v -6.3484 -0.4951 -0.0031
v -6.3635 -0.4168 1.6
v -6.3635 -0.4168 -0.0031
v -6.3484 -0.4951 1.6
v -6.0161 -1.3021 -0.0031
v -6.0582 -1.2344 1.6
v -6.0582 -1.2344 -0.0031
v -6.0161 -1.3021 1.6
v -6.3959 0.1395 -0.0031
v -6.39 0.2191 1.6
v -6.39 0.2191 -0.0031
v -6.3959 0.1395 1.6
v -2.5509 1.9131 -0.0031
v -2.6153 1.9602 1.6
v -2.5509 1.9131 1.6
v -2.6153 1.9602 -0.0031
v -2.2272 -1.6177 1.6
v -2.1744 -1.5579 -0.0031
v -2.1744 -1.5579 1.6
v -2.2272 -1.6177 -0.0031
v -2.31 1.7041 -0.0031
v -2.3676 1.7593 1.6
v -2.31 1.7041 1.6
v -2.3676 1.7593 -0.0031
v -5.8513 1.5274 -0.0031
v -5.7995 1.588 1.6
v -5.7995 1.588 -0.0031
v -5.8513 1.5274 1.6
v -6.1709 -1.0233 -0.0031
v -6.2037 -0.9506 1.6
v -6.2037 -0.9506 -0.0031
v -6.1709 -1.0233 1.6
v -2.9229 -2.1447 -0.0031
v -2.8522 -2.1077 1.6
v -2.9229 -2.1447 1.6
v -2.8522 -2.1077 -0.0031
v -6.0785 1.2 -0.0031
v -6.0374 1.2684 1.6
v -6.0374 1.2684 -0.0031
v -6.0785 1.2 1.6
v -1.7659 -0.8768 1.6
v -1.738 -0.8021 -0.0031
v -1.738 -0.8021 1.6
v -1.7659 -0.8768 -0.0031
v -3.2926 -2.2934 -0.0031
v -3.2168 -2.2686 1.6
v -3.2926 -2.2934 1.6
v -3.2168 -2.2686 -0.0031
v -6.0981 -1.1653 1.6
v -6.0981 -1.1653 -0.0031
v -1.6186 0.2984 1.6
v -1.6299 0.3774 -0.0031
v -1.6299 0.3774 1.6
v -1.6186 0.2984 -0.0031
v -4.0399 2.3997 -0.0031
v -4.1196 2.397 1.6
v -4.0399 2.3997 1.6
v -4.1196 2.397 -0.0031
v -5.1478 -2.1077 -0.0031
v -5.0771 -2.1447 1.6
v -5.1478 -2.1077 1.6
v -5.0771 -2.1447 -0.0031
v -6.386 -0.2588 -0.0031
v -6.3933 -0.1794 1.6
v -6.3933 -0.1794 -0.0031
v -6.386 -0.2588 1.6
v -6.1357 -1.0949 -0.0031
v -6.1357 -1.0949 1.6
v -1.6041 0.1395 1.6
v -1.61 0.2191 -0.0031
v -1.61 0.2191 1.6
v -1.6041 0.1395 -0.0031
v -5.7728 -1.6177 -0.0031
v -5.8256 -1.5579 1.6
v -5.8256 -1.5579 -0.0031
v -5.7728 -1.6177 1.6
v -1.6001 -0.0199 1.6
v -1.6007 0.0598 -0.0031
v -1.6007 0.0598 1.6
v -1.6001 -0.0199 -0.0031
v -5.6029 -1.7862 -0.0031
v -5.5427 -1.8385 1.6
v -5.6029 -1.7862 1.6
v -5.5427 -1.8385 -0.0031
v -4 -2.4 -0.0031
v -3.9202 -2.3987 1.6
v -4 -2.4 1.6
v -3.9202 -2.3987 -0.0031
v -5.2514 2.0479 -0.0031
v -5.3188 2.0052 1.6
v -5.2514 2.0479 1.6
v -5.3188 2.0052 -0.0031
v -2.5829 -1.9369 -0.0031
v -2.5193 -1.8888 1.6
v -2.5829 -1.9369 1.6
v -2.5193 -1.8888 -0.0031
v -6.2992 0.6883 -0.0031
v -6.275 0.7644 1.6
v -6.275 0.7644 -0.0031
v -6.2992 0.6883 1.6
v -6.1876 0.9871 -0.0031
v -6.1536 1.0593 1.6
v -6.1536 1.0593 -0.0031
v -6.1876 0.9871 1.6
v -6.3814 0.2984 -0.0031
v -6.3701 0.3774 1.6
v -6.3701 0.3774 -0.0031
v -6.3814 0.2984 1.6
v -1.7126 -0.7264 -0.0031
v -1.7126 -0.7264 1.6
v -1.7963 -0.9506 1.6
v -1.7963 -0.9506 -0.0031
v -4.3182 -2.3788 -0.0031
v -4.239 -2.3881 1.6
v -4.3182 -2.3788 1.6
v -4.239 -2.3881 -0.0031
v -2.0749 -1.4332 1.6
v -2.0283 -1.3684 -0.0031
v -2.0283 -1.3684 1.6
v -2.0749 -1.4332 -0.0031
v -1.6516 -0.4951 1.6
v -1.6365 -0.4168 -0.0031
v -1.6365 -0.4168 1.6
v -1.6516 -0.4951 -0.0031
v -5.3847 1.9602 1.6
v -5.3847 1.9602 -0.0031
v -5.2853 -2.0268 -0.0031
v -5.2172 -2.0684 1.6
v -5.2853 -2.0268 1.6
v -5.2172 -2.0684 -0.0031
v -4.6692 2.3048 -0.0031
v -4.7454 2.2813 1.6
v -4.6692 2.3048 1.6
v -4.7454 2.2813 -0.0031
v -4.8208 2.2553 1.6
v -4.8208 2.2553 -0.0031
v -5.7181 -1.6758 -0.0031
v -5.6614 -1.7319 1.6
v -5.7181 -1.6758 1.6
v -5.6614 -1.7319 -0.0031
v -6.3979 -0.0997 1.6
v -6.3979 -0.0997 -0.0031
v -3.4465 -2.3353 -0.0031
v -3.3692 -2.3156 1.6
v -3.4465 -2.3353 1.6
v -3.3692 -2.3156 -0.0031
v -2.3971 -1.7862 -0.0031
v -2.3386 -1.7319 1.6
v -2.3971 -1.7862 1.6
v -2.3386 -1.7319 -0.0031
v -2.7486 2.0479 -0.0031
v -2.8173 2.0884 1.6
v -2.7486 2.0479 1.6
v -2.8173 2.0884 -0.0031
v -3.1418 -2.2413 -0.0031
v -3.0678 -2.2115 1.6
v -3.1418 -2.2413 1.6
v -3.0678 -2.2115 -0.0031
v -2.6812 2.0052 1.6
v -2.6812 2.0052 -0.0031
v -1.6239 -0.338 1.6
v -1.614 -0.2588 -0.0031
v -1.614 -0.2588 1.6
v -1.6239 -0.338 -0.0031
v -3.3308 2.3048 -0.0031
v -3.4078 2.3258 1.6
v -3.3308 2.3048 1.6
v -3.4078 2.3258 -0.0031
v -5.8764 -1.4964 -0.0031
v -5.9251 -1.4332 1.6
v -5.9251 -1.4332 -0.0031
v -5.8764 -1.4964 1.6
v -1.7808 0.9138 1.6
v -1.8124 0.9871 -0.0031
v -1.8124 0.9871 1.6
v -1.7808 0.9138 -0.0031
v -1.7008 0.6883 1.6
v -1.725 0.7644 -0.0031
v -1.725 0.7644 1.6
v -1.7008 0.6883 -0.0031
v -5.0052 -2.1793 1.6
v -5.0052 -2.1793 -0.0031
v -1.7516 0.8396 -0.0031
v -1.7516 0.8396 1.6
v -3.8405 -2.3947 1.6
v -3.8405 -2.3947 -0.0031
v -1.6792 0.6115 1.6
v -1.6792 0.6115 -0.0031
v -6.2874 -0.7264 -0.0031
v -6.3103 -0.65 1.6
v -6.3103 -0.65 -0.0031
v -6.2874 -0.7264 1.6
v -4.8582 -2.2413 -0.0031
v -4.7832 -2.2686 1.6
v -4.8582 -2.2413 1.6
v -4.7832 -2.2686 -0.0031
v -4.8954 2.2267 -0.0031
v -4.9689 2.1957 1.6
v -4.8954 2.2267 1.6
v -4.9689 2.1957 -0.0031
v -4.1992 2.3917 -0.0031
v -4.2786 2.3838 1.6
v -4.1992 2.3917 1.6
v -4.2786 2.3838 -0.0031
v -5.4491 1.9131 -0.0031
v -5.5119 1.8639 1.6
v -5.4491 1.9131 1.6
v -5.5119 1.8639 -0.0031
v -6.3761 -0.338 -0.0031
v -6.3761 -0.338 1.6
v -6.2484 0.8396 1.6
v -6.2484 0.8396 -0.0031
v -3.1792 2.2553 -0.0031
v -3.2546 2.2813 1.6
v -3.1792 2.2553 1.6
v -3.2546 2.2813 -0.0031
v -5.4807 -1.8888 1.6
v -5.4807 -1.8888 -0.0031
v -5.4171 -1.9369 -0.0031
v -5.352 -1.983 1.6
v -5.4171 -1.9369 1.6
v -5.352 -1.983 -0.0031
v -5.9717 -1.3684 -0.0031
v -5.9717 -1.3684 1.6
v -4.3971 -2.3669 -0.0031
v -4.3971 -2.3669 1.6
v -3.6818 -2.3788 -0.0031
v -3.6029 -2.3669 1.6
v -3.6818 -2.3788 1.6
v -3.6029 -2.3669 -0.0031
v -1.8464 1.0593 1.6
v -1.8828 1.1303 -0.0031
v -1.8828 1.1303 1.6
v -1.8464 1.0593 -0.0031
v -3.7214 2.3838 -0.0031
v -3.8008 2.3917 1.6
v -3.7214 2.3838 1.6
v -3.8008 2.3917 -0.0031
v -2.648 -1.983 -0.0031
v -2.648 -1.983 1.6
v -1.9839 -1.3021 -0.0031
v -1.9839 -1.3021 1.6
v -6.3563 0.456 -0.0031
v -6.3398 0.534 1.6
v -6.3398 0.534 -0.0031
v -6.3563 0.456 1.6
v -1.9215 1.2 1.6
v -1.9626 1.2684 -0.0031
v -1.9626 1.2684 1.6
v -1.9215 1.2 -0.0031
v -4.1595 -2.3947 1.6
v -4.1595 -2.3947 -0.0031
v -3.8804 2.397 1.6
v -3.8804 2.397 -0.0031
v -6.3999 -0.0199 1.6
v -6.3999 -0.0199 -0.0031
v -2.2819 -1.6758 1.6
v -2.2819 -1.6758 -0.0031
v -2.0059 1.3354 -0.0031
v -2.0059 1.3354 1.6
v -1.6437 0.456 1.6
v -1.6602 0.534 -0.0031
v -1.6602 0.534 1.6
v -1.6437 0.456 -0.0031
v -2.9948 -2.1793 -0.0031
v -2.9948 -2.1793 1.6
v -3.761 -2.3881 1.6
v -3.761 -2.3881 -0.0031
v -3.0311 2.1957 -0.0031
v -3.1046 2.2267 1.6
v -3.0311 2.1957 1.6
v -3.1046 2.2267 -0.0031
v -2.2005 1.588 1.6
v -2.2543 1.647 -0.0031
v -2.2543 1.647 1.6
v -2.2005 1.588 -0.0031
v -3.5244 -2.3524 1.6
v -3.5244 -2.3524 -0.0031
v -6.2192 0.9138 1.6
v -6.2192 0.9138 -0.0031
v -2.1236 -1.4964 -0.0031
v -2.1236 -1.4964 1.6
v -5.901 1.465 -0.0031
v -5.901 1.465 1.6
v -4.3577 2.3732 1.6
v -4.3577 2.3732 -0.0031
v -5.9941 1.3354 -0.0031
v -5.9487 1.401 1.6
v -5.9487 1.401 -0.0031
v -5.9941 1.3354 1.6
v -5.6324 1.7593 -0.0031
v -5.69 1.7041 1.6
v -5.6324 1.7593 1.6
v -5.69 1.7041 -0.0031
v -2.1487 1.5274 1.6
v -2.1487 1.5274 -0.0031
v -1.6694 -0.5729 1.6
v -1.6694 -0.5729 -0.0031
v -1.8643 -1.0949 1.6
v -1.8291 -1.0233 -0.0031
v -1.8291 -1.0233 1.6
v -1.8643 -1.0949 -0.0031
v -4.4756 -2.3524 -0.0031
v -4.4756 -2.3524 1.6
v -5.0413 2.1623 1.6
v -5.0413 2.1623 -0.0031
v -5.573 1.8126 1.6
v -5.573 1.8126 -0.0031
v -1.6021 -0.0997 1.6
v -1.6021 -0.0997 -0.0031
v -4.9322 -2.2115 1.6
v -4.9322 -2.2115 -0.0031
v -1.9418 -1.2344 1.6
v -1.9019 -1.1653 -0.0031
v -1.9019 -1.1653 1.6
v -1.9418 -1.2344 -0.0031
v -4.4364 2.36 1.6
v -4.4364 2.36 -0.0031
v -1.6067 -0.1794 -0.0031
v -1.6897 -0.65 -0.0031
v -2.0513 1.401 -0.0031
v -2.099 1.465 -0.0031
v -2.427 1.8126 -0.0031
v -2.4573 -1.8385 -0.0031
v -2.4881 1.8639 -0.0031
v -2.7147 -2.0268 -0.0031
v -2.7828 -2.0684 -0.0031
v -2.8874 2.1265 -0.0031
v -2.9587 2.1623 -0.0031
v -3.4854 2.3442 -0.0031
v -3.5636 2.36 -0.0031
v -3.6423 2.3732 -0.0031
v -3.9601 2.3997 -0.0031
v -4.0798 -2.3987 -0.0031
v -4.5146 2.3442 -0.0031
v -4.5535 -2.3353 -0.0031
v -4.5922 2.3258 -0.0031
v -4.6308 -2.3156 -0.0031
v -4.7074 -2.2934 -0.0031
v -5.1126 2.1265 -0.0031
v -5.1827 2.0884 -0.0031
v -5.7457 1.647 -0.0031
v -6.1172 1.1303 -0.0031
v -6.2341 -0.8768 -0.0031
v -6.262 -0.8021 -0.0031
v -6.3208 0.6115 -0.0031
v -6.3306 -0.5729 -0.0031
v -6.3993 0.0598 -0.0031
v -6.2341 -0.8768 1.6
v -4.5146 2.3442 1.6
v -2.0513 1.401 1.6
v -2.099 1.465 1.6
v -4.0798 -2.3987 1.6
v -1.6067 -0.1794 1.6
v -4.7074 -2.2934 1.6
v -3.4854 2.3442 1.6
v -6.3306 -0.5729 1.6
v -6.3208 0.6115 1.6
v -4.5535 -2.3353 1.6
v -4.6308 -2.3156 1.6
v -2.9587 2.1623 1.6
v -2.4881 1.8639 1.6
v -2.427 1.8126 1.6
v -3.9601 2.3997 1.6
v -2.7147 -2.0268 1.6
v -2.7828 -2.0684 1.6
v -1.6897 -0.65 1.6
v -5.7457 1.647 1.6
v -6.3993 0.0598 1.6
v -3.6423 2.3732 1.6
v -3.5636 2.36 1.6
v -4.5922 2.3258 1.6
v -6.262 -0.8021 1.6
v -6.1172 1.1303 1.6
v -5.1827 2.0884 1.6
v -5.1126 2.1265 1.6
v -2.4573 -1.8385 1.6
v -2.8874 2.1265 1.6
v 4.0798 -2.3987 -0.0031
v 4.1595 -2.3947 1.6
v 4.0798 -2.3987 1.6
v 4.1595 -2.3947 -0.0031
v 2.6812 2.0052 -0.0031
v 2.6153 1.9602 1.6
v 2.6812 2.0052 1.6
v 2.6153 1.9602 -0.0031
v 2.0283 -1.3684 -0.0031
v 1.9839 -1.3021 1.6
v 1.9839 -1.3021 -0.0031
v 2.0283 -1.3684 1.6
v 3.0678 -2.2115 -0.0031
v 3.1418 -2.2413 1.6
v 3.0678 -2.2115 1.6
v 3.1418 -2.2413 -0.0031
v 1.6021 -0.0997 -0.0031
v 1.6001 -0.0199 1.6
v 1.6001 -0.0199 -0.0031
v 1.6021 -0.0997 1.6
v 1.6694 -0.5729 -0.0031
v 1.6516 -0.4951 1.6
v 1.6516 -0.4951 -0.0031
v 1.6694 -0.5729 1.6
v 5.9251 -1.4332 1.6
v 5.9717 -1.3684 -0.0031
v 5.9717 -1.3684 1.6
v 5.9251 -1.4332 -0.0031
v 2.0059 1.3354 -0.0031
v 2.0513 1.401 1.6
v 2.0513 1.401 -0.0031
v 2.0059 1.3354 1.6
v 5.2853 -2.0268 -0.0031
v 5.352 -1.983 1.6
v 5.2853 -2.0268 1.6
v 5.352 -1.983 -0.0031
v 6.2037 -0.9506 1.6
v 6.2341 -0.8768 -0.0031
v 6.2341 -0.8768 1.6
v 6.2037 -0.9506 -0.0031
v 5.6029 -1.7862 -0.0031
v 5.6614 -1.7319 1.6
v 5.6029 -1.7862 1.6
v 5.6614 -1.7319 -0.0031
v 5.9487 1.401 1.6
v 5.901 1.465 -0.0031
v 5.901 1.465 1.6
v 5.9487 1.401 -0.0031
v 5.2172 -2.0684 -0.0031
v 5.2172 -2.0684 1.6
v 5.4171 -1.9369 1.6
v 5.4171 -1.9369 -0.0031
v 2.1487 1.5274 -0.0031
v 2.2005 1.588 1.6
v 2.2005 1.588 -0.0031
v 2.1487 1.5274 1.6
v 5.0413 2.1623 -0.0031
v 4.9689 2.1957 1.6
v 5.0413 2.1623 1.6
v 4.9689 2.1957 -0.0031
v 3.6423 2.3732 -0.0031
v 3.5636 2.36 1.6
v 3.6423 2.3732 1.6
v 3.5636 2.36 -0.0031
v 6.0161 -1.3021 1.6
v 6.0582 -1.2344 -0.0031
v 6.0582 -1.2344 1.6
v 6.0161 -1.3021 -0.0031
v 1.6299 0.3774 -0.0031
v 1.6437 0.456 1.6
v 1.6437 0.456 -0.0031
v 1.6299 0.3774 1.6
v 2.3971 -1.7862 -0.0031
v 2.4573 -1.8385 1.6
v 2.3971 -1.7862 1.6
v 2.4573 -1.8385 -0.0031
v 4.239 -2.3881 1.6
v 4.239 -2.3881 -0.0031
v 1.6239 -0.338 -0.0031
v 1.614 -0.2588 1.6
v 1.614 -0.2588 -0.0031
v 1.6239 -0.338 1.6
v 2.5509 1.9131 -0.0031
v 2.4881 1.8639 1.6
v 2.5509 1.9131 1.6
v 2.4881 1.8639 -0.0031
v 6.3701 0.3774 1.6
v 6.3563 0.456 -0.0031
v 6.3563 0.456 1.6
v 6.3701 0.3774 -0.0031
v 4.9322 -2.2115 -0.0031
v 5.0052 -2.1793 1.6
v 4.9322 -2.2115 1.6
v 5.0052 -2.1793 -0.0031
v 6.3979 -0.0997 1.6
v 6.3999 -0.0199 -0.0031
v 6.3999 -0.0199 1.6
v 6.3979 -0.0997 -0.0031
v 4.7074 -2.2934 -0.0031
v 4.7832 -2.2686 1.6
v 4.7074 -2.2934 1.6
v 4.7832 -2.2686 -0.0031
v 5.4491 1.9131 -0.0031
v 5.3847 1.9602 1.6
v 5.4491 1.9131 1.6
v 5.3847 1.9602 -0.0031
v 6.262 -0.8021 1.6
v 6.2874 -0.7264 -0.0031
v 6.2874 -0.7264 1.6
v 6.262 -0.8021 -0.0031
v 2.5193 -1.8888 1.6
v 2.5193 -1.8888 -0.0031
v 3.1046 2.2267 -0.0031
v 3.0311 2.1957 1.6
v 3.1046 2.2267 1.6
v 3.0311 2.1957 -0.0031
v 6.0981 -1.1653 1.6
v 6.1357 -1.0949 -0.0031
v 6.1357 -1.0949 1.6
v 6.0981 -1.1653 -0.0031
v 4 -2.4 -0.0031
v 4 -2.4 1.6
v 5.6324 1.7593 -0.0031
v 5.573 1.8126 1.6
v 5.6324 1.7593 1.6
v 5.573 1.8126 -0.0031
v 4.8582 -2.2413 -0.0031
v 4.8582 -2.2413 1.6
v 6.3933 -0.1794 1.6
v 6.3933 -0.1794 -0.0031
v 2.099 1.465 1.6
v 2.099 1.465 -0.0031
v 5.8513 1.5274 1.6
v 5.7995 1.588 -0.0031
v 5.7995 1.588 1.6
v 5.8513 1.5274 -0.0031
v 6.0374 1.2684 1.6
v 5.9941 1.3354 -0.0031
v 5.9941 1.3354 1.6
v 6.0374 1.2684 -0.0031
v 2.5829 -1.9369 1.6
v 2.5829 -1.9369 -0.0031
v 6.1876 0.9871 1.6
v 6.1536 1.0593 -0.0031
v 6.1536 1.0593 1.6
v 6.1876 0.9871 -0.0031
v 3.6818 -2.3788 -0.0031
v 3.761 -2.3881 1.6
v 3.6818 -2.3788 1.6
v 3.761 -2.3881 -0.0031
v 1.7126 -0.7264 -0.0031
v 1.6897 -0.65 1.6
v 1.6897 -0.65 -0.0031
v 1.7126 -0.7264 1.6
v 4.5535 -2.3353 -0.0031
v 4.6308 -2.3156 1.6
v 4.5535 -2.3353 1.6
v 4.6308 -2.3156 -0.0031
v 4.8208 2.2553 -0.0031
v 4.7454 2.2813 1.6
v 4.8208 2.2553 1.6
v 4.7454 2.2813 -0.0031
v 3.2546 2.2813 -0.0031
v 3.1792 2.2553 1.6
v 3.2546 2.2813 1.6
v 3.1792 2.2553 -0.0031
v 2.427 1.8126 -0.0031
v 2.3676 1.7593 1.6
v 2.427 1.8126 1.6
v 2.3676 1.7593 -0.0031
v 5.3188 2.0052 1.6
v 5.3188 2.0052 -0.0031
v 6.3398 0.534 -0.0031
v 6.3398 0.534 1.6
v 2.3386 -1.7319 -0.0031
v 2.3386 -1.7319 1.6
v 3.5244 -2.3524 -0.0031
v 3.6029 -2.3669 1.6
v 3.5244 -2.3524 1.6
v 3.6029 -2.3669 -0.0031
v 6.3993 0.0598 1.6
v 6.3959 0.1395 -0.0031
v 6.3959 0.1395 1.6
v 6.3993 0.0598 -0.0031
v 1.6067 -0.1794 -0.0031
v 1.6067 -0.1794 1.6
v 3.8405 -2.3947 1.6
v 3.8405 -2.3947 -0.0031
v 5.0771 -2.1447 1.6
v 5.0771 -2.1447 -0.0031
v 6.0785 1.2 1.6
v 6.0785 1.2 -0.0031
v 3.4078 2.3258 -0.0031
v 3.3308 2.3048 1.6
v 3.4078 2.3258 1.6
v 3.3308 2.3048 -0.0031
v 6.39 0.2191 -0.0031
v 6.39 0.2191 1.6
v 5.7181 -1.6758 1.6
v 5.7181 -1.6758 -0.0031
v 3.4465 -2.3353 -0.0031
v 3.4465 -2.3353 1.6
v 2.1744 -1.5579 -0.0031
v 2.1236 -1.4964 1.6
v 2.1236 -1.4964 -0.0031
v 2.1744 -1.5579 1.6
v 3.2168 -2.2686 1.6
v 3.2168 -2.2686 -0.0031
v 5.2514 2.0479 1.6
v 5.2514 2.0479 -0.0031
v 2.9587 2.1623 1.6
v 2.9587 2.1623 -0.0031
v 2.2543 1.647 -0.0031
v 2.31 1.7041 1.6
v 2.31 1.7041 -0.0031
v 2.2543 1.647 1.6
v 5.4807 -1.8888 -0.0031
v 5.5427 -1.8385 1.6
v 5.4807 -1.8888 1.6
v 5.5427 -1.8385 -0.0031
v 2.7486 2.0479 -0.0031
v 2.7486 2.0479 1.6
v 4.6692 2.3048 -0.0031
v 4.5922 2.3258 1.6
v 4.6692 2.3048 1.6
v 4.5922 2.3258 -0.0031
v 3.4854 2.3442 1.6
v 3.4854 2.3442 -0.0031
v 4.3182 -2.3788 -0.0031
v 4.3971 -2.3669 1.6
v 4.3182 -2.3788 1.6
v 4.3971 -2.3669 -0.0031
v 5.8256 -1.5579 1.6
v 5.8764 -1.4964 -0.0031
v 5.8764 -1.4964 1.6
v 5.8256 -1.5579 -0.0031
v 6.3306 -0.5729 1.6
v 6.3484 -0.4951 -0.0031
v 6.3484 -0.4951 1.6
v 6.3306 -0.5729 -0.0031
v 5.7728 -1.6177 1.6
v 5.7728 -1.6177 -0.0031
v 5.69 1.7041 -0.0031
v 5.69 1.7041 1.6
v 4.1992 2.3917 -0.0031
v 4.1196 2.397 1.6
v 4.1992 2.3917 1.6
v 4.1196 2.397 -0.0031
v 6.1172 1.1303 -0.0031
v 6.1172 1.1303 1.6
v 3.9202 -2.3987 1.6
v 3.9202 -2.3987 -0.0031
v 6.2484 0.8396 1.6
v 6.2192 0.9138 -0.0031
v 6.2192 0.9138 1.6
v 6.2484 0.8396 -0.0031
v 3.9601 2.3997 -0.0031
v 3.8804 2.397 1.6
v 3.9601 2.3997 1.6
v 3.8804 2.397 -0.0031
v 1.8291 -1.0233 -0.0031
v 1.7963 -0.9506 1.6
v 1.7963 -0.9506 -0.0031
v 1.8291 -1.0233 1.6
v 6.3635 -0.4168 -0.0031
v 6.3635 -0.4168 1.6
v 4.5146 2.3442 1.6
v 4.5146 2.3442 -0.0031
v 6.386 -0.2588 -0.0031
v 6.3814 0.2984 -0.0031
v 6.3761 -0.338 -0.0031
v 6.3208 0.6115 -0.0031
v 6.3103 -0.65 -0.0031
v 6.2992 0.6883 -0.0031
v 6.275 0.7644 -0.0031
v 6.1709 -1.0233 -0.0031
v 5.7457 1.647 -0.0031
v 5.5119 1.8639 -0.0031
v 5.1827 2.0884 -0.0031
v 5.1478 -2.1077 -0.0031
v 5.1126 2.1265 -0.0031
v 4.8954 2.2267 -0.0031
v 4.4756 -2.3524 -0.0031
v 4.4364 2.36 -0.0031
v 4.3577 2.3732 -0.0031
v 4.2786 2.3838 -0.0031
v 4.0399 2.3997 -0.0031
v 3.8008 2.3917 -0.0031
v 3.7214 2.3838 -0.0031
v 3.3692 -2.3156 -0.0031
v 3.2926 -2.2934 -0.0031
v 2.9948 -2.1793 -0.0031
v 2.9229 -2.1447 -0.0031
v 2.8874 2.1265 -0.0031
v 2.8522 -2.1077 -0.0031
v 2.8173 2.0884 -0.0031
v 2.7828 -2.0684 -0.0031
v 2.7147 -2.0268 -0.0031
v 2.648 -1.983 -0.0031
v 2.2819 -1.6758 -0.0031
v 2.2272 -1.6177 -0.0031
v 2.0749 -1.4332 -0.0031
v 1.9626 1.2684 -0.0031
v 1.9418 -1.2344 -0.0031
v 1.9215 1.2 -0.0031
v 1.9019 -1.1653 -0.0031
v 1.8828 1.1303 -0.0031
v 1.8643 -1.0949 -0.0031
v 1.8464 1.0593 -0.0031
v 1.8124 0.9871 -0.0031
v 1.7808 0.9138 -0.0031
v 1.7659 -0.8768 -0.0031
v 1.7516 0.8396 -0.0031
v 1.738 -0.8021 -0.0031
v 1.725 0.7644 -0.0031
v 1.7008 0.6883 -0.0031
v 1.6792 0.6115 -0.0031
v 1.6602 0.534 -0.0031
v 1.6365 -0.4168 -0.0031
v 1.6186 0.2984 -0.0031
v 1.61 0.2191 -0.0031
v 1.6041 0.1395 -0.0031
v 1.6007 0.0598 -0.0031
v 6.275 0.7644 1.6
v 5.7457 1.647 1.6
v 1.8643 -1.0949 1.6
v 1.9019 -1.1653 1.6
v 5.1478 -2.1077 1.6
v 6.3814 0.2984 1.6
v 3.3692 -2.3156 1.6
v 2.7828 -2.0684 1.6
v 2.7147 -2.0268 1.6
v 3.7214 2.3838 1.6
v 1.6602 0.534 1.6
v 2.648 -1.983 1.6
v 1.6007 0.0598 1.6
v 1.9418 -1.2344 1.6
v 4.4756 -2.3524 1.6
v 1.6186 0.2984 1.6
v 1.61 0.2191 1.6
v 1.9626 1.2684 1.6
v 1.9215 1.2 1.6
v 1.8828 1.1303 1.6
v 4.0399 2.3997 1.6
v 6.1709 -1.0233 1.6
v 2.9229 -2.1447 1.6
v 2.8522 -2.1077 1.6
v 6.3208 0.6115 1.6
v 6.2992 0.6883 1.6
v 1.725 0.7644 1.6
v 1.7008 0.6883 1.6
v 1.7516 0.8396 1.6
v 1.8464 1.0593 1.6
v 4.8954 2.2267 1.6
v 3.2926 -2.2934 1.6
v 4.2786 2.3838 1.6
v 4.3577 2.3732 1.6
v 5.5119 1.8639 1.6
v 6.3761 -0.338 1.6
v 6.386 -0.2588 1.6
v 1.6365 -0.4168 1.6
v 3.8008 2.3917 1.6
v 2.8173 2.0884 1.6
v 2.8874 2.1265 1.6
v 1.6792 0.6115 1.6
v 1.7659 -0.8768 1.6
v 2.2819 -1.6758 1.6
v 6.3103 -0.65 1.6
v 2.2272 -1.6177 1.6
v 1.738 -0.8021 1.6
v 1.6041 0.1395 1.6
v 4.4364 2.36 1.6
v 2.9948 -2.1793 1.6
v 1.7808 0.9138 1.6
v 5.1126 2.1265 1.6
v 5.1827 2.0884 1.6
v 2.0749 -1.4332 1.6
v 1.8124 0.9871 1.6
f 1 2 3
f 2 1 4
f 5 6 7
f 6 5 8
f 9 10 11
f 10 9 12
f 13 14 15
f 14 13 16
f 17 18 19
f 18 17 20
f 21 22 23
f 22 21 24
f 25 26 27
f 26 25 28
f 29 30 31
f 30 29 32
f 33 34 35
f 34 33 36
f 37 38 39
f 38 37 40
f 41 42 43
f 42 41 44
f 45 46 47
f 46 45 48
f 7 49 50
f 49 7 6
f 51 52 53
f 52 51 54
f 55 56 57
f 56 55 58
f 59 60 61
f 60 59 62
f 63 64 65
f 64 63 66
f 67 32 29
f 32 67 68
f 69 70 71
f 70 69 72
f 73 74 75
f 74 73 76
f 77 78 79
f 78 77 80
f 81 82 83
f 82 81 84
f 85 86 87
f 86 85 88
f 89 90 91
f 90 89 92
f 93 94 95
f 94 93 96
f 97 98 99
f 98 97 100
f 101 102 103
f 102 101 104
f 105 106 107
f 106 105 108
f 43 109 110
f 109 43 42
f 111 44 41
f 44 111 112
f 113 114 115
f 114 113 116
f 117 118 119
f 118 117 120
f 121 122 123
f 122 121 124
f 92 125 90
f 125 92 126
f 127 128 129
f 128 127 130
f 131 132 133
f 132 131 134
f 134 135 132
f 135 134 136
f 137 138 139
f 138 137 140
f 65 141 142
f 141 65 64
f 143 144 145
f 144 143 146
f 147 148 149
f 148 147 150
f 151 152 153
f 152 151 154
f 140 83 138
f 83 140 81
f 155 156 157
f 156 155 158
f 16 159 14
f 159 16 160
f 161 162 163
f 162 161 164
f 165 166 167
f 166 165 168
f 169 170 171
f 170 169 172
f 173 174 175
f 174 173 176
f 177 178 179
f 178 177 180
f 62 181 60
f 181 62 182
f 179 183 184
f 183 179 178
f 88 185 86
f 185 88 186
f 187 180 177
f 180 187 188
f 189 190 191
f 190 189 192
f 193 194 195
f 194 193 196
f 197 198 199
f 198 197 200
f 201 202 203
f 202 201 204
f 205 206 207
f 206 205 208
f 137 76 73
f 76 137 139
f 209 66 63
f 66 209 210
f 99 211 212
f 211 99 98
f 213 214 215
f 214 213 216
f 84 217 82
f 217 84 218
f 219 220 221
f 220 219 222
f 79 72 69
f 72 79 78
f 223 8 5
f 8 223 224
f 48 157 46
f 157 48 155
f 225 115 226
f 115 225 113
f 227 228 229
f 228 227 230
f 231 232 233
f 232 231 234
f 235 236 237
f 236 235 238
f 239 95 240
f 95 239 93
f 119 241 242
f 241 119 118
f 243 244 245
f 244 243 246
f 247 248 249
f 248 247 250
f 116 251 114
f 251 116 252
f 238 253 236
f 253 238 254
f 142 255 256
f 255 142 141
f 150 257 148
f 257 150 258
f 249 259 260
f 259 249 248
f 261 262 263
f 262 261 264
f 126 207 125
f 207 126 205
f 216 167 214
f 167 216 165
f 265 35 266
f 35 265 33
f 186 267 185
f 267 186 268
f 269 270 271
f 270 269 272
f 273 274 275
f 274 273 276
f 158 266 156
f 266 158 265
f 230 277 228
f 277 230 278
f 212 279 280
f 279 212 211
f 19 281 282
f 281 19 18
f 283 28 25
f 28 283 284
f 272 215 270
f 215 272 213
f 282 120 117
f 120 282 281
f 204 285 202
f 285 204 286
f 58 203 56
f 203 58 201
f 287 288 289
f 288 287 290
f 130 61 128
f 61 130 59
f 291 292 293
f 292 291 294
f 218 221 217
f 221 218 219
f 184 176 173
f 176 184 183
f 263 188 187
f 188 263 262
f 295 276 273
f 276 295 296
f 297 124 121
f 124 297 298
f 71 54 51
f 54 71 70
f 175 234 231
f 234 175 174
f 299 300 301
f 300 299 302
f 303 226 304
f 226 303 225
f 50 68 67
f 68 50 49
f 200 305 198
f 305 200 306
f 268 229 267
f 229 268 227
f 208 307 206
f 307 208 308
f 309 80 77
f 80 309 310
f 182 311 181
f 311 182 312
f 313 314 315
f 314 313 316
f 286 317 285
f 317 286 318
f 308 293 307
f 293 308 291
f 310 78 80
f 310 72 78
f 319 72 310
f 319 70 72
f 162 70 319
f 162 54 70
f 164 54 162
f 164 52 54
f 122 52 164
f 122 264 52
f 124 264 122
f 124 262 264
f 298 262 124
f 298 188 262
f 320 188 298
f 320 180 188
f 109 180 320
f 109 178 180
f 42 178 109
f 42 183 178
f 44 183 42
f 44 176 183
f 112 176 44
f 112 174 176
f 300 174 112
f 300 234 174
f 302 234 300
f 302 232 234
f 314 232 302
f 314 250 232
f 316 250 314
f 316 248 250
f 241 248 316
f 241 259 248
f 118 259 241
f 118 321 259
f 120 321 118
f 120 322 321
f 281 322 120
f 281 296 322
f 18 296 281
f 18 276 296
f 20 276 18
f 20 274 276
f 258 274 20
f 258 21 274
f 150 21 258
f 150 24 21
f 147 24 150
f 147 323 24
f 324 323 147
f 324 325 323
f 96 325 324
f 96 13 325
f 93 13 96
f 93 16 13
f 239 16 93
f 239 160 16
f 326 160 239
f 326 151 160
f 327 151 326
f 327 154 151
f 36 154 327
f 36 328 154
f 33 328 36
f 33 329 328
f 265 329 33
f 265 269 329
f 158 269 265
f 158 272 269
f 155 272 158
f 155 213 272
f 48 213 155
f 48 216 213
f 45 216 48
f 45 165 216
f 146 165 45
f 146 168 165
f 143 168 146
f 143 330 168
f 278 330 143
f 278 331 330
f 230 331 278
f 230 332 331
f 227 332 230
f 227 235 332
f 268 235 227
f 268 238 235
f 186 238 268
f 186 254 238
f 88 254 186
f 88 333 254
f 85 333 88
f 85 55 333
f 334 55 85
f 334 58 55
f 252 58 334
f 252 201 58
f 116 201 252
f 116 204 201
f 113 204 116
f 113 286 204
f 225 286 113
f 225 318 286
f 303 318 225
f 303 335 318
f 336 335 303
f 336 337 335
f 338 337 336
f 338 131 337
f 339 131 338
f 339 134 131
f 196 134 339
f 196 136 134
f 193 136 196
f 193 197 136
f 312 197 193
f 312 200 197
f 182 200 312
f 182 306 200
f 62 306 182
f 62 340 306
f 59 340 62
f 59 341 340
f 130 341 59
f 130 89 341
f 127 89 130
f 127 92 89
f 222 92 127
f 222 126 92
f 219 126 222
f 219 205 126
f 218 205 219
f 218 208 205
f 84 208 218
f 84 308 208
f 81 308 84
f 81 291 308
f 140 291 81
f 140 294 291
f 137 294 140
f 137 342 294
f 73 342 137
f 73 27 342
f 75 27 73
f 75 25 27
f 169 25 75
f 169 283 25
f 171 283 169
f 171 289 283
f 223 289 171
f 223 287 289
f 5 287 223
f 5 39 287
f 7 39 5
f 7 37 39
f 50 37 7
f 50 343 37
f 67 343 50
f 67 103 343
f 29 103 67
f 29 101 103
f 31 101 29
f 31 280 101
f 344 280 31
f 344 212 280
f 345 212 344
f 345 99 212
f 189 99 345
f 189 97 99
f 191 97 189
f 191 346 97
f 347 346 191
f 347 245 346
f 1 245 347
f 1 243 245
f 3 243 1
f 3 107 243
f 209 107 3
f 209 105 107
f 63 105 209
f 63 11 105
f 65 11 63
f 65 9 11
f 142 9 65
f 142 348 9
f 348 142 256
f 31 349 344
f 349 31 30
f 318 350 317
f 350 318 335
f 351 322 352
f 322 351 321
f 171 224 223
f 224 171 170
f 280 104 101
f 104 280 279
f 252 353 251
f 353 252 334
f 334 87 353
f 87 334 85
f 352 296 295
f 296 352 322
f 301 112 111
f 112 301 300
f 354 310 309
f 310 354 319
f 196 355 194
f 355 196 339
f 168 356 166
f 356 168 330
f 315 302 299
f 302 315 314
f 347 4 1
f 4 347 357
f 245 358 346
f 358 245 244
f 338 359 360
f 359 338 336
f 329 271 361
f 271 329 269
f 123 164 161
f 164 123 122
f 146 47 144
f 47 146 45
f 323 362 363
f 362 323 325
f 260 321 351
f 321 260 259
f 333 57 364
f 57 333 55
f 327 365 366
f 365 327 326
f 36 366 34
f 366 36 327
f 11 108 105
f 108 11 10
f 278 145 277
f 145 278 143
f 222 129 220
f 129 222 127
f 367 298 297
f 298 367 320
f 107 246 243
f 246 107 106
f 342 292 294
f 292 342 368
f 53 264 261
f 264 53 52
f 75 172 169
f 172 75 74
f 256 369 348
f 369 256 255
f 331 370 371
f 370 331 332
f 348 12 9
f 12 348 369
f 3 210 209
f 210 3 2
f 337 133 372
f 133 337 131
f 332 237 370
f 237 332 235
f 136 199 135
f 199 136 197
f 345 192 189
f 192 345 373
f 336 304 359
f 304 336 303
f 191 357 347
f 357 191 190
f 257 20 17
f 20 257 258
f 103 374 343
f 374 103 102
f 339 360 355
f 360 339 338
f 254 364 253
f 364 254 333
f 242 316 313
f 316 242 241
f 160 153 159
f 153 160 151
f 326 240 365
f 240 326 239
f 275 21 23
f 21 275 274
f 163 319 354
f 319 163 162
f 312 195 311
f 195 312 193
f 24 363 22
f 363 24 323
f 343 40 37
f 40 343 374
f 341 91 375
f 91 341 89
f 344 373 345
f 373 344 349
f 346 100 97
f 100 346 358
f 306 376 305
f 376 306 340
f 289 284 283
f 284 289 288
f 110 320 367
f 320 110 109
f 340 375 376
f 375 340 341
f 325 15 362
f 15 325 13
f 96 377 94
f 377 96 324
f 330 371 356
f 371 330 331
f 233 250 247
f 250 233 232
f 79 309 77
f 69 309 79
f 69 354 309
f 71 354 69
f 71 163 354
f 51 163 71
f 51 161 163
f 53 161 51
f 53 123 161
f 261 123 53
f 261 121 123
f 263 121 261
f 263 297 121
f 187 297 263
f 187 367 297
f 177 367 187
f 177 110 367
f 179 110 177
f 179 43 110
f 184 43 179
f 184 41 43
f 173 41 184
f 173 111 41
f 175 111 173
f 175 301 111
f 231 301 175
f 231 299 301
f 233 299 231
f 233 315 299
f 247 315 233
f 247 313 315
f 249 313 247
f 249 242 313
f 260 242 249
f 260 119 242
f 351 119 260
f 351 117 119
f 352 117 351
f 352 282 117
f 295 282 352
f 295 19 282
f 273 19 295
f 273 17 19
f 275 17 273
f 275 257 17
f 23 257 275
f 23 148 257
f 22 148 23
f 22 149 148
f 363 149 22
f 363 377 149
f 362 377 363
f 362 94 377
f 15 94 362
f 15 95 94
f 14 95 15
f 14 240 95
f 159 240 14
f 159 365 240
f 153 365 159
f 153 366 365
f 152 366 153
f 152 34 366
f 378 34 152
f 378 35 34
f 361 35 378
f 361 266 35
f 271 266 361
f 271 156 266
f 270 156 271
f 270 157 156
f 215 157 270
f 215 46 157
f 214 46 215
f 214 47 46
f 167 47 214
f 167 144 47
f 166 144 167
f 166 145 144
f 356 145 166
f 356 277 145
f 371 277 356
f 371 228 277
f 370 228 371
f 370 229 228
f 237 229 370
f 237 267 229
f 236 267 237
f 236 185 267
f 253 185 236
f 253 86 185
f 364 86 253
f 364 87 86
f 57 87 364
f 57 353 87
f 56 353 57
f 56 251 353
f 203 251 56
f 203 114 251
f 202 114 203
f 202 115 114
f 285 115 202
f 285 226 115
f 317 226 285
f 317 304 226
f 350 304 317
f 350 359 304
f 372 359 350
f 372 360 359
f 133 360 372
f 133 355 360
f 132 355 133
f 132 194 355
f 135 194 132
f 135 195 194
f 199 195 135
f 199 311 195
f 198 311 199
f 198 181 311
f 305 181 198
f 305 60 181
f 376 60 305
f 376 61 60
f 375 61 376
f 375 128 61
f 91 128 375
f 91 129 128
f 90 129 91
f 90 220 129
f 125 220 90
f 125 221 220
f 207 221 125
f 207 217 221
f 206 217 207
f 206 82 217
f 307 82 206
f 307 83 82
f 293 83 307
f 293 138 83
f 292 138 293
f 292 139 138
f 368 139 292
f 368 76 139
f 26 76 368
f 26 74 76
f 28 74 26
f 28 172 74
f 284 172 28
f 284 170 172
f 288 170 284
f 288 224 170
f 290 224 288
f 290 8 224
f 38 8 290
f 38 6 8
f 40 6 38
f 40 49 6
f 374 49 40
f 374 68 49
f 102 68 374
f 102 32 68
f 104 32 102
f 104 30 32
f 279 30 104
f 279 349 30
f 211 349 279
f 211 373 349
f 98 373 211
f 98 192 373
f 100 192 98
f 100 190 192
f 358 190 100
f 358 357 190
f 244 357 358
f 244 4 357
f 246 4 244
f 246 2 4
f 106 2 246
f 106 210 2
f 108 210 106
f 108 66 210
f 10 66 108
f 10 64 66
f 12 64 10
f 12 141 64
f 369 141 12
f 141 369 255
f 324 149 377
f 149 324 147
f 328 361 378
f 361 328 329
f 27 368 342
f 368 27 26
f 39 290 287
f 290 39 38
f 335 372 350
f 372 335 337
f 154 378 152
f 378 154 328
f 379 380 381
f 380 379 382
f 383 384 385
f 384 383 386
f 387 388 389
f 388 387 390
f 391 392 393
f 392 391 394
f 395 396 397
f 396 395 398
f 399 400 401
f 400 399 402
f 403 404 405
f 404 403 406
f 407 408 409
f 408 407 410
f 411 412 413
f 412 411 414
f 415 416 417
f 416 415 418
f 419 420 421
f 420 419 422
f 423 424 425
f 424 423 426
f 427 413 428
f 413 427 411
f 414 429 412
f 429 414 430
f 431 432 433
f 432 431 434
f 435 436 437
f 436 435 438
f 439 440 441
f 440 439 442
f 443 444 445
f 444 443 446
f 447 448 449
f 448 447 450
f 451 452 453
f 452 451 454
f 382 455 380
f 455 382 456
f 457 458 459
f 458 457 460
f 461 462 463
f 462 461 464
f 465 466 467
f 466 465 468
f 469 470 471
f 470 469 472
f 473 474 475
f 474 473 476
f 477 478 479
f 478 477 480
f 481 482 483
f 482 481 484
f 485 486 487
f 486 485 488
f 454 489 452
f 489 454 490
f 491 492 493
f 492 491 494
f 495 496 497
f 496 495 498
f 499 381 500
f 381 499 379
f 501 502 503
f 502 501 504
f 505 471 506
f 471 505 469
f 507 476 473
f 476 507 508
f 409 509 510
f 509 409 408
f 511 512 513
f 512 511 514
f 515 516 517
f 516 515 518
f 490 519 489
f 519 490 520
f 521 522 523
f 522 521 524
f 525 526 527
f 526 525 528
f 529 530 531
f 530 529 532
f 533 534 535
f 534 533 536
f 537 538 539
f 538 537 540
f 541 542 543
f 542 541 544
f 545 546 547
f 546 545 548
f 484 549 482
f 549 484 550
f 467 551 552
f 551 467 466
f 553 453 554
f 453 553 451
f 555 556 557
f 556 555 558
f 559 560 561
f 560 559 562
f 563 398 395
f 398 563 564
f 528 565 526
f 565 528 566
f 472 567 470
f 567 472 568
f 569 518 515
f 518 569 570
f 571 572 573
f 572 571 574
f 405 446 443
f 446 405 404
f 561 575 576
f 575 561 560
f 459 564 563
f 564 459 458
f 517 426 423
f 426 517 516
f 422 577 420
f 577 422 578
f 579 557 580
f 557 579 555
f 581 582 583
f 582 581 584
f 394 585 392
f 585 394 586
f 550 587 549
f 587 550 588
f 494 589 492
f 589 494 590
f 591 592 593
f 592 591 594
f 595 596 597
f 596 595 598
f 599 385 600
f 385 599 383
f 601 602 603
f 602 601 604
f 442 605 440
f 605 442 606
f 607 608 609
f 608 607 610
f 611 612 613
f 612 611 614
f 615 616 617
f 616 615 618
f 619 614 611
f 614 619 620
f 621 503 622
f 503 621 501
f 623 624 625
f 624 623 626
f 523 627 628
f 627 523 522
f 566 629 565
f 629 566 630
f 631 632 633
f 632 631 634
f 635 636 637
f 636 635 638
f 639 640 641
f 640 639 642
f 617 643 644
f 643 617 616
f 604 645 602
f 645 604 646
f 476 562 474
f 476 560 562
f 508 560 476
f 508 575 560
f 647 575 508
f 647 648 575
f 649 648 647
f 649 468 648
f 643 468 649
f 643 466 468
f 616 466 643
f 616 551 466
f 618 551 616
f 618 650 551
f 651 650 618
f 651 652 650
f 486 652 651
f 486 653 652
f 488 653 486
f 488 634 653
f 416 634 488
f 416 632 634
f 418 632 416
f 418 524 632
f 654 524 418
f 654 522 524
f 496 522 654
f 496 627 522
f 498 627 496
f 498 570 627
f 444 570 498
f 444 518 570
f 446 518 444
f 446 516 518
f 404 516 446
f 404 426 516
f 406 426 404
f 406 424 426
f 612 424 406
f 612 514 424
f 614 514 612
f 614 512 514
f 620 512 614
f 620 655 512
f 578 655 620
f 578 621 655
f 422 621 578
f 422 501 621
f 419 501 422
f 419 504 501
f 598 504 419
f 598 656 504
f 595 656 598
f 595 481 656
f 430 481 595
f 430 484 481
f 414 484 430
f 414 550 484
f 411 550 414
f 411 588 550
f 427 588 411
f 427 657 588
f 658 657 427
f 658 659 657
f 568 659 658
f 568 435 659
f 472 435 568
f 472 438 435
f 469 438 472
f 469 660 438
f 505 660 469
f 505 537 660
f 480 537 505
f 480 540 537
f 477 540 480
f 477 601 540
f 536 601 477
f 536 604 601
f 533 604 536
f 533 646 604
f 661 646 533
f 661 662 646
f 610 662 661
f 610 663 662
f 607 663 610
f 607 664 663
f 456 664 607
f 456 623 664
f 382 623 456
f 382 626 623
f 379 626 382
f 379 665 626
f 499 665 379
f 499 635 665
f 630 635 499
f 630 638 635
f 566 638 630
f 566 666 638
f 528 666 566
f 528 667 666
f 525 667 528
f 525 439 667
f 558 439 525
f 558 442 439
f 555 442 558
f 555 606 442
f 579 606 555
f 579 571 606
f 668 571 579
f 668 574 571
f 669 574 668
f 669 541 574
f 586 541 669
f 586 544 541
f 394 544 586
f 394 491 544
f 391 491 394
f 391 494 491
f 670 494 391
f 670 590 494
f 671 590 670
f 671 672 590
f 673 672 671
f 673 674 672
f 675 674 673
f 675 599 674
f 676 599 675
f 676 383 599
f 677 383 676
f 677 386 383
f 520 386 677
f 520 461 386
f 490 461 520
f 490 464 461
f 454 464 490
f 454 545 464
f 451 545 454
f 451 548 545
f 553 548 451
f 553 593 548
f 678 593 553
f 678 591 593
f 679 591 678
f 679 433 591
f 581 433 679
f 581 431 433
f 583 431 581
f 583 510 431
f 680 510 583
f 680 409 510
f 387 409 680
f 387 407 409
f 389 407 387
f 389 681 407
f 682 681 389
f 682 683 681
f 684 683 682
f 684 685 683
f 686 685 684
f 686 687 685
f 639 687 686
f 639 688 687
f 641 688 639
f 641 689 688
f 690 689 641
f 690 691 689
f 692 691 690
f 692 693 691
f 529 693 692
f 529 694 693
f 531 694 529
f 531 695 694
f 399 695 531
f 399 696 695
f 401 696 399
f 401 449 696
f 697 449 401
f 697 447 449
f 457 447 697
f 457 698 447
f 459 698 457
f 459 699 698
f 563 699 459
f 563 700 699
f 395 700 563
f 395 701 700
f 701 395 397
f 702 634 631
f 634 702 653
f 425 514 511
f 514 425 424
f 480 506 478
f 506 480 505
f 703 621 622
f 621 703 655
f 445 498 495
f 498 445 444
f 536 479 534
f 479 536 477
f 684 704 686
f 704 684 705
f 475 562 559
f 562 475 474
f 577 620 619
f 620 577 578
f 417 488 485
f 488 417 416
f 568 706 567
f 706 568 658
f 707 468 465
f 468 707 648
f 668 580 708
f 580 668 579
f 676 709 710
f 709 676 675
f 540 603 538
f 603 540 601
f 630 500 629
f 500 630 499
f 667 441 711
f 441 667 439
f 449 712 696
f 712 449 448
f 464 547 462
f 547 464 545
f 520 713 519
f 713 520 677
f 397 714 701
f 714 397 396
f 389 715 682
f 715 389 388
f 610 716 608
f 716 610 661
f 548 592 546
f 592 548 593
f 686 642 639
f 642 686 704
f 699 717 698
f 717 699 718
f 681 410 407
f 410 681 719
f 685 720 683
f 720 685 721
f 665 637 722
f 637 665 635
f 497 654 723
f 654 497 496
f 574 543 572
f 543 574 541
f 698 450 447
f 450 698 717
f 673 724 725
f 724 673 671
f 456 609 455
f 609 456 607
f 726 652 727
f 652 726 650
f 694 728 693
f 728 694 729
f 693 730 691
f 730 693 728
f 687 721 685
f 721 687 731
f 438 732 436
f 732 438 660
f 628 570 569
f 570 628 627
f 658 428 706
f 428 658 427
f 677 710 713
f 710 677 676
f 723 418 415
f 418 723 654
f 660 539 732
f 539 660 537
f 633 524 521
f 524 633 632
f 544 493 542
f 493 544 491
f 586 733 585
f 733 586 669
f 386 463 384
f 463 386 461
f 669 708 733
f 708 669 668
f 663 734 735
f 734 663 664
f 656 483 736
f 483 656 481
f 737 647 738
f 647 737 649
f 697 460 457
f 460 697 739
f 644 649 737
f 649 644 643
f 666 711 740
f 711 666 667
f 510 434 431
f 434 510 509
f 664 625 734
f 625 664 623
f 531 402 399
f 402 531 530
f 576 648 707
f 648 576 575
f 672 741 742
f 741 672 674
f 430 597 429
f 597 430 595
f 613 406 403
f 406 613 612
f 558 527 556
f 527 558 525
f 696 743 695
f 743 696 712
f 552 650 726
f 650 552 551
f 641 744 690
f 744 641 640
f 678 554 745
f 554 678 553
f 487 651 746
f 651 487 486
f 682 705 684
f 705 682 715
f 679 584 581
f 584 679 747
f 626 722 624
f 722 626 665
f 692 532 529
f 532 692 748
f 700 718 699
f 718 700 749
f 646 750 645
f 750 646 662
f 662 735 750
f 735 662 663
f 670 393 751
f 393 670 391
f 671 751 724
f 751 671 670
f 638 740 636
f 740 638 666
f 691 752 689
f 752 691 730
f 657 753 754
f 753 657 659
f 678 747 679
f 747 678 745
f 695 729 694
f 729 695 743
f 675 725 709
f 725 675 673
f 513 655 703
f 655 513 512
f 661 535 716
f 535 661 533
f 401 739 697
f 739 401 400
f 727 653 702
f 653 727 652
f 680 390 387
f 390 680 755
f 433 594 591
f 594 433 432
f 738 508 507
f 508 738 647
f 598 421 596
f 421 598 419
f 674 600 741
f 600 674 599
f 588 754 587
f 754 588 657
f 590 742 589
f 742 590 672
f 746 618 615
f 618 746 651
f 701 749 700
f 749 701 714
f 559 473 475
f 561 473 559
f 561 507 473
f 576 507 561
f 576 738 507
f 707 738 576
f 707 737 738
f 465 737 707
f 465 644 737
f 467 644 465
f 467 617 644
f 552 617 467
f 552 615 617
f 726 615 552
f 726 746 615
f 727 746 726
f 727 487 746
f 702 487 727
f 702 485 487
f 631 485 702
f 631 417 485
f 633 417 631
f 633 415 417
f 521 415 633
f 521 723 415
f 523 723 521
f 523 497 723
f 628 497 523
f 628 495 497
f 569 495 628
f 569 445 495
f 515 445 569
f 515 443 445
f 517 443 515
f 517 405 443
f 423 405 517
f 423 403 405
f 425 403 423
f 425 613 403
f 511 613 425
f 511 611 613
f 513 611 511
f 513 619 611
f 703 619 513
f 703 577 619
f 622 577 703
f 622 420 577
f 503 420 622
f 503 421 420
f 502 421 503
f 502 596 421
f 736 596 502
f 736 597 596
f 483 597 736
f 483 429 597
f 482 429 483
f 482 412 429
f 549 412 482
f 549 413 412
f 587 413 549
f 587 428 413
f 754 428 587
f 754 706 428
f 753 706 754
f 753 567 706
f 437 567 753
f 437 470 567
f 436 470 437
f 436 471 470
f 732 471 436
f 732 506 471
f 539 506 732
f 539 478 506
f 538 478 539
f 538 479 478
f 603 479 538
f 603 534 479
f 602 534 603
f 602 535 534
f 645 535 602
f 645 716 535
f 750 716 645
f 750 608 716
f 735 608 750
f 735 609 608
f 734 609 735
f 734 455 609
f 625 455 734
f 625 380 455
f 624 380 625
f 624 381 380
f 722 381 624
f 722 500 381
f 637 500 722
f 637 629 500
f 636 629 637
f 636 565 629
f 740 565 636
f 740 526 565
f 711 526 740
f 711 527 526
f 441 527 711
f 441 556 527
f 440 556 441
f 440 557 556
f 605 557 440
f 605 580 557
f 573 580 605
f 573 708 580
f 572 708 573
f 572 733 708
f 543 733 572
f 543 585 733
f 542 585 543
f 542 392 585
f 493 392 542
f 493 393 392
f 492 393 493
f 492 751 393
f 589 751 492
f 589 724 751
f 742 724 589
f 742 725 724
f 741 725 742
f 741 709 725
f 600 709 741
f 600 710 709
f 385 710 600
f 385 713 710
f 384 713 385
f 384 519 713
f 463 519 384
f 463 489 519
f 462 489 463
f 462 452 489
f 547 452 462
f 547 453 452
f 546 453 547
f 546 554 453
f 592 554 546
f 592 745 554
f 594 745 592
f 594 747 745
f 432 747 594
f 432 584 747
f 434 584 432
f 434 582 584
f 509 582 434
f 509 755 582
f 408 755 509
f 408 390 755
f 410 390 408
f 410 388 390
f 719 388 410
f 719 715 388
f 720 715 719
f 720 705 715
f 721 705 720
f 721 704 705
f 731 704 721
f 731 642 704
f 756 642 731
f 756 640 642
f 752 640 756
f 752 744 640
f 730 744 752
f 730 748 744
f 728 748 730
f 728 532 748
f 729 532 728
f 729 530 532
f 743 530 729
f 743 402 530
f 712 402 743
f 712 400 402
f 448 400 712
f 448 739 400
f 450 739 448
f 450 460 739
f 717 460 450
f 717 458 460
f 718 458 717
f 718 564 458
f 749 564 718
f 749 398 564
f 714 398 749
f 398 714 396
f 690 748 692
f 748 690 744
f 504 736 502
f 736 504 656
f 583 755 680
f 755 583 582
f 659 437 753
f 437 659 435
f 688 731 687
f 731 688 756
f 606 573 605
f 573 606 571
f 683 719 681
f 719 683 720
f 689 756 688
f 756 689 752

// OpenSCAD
use <../lib.scad>
use <s/3068p68a.scad>
use <s/3298s01.scad>
$fa=1; $fs=0.2;
function ldraw_lib__3298p68(realsolid=false) = [
// 0 Slope Brick 33  3 x  2 with MTron Logo Pattern
// 0 Name: 3298p68.dat
// 0 Author: John Van Zwieten [jvan]
// 0 !LDRAW_ORG Part UPDATE 2004-02
// 0 !LICENSE Licensed under CC BY 2.0 and CC BY 4.0 : see CAreadme.txt
// 
// 0 BFC CERTIFY CCW
  [0,"BFC","CERTIFY"],
  [0,"BFC","CCW"],
// 
// 0 !HISTORY 1998-09-15 [PTadmin] Official Update 1998-08
// 0 !HISTORY 2002-09-13 [izanette] modified with WINDZ for BFC compliance
// 0 !HISTORY 2003-03-09 [OrionP] moved guts to subpart
// 0 !HISTORY 2003-07-11 [Steffen] moved pattern to subpart
// 0 !HISTORY 2004-04-22 [PTadmin] Official Update 2004-02
// 0 !HISTORY 2007-06-25 [PTadmin] Header formatted for Contributor Agreement
// 0 !HISTORY 2008-07-01 [PTadmin] Official Update 2008-01
// 
// 
// 1 16 0 0 0 1 0 0 0 1 0 0 0 1 s\3298s01.dat
  [1,16,0,0,0,1,0,0,0,1,0,0,0,1, ldraw_lib__s__3298s01(realsolid)],
// 1 16 0 10 -30 1 0 0 0 0.894427 -0.447214 0 0.447214 0.894427 s\3068p68a.dat
  [1,16,0,10,-30,1,0,0,0,0.894427,-0.447214,0,0.447214,0.894427, ldraw_lib__s__3068p68a(realsolid)],
// 4 16 -20 0 -10 -18.5 1.73899 -13.478 18.5 1.73899 -13.478 20 0 -10
  [4,16,-20,0,-10,-18.5,1.73899,-13.478,18.5,1.73899,-13.478,20,0,-10],
// 4 16 -20 20 -50 20 20 -50 18.5 18.251 -46.502 -18.5 18.251 -46.502
  [4,16,-20,20,-50,20,20,-50,18.5,18.251,-46.502,-18.5,18.251,-46.502],
// 4 16 -18.5 18.251 -46.502 -18.5 1.73899 -13.478 -20 0 -10 -20 20 -50
  [4,16,-18.5,18.251,-46.502,-18.5,1.73899,-13.478,-20,0,-10,-20,20,-50],
// 4 16 20 0 -10 18.5 1.73899 -13.478 18.5 18.251 -46.502 20 20 -50
  [4,16,20,0,-10,18.5,1.73899,-13.478,18.5,18.251,-46.502,20,20,-50],
// 0
];
module ldraw_lib__3298p68(step=0, col=false, unit=2/5, alt=false, line=0.2, solid=!$preview)
    makepoly(ldraw_lib__3298p68(solid), step=step, col=col, unit=unit, alt=alt, line=line, solid=solid);
ldraw_lib__3298p68(line=0.2);
